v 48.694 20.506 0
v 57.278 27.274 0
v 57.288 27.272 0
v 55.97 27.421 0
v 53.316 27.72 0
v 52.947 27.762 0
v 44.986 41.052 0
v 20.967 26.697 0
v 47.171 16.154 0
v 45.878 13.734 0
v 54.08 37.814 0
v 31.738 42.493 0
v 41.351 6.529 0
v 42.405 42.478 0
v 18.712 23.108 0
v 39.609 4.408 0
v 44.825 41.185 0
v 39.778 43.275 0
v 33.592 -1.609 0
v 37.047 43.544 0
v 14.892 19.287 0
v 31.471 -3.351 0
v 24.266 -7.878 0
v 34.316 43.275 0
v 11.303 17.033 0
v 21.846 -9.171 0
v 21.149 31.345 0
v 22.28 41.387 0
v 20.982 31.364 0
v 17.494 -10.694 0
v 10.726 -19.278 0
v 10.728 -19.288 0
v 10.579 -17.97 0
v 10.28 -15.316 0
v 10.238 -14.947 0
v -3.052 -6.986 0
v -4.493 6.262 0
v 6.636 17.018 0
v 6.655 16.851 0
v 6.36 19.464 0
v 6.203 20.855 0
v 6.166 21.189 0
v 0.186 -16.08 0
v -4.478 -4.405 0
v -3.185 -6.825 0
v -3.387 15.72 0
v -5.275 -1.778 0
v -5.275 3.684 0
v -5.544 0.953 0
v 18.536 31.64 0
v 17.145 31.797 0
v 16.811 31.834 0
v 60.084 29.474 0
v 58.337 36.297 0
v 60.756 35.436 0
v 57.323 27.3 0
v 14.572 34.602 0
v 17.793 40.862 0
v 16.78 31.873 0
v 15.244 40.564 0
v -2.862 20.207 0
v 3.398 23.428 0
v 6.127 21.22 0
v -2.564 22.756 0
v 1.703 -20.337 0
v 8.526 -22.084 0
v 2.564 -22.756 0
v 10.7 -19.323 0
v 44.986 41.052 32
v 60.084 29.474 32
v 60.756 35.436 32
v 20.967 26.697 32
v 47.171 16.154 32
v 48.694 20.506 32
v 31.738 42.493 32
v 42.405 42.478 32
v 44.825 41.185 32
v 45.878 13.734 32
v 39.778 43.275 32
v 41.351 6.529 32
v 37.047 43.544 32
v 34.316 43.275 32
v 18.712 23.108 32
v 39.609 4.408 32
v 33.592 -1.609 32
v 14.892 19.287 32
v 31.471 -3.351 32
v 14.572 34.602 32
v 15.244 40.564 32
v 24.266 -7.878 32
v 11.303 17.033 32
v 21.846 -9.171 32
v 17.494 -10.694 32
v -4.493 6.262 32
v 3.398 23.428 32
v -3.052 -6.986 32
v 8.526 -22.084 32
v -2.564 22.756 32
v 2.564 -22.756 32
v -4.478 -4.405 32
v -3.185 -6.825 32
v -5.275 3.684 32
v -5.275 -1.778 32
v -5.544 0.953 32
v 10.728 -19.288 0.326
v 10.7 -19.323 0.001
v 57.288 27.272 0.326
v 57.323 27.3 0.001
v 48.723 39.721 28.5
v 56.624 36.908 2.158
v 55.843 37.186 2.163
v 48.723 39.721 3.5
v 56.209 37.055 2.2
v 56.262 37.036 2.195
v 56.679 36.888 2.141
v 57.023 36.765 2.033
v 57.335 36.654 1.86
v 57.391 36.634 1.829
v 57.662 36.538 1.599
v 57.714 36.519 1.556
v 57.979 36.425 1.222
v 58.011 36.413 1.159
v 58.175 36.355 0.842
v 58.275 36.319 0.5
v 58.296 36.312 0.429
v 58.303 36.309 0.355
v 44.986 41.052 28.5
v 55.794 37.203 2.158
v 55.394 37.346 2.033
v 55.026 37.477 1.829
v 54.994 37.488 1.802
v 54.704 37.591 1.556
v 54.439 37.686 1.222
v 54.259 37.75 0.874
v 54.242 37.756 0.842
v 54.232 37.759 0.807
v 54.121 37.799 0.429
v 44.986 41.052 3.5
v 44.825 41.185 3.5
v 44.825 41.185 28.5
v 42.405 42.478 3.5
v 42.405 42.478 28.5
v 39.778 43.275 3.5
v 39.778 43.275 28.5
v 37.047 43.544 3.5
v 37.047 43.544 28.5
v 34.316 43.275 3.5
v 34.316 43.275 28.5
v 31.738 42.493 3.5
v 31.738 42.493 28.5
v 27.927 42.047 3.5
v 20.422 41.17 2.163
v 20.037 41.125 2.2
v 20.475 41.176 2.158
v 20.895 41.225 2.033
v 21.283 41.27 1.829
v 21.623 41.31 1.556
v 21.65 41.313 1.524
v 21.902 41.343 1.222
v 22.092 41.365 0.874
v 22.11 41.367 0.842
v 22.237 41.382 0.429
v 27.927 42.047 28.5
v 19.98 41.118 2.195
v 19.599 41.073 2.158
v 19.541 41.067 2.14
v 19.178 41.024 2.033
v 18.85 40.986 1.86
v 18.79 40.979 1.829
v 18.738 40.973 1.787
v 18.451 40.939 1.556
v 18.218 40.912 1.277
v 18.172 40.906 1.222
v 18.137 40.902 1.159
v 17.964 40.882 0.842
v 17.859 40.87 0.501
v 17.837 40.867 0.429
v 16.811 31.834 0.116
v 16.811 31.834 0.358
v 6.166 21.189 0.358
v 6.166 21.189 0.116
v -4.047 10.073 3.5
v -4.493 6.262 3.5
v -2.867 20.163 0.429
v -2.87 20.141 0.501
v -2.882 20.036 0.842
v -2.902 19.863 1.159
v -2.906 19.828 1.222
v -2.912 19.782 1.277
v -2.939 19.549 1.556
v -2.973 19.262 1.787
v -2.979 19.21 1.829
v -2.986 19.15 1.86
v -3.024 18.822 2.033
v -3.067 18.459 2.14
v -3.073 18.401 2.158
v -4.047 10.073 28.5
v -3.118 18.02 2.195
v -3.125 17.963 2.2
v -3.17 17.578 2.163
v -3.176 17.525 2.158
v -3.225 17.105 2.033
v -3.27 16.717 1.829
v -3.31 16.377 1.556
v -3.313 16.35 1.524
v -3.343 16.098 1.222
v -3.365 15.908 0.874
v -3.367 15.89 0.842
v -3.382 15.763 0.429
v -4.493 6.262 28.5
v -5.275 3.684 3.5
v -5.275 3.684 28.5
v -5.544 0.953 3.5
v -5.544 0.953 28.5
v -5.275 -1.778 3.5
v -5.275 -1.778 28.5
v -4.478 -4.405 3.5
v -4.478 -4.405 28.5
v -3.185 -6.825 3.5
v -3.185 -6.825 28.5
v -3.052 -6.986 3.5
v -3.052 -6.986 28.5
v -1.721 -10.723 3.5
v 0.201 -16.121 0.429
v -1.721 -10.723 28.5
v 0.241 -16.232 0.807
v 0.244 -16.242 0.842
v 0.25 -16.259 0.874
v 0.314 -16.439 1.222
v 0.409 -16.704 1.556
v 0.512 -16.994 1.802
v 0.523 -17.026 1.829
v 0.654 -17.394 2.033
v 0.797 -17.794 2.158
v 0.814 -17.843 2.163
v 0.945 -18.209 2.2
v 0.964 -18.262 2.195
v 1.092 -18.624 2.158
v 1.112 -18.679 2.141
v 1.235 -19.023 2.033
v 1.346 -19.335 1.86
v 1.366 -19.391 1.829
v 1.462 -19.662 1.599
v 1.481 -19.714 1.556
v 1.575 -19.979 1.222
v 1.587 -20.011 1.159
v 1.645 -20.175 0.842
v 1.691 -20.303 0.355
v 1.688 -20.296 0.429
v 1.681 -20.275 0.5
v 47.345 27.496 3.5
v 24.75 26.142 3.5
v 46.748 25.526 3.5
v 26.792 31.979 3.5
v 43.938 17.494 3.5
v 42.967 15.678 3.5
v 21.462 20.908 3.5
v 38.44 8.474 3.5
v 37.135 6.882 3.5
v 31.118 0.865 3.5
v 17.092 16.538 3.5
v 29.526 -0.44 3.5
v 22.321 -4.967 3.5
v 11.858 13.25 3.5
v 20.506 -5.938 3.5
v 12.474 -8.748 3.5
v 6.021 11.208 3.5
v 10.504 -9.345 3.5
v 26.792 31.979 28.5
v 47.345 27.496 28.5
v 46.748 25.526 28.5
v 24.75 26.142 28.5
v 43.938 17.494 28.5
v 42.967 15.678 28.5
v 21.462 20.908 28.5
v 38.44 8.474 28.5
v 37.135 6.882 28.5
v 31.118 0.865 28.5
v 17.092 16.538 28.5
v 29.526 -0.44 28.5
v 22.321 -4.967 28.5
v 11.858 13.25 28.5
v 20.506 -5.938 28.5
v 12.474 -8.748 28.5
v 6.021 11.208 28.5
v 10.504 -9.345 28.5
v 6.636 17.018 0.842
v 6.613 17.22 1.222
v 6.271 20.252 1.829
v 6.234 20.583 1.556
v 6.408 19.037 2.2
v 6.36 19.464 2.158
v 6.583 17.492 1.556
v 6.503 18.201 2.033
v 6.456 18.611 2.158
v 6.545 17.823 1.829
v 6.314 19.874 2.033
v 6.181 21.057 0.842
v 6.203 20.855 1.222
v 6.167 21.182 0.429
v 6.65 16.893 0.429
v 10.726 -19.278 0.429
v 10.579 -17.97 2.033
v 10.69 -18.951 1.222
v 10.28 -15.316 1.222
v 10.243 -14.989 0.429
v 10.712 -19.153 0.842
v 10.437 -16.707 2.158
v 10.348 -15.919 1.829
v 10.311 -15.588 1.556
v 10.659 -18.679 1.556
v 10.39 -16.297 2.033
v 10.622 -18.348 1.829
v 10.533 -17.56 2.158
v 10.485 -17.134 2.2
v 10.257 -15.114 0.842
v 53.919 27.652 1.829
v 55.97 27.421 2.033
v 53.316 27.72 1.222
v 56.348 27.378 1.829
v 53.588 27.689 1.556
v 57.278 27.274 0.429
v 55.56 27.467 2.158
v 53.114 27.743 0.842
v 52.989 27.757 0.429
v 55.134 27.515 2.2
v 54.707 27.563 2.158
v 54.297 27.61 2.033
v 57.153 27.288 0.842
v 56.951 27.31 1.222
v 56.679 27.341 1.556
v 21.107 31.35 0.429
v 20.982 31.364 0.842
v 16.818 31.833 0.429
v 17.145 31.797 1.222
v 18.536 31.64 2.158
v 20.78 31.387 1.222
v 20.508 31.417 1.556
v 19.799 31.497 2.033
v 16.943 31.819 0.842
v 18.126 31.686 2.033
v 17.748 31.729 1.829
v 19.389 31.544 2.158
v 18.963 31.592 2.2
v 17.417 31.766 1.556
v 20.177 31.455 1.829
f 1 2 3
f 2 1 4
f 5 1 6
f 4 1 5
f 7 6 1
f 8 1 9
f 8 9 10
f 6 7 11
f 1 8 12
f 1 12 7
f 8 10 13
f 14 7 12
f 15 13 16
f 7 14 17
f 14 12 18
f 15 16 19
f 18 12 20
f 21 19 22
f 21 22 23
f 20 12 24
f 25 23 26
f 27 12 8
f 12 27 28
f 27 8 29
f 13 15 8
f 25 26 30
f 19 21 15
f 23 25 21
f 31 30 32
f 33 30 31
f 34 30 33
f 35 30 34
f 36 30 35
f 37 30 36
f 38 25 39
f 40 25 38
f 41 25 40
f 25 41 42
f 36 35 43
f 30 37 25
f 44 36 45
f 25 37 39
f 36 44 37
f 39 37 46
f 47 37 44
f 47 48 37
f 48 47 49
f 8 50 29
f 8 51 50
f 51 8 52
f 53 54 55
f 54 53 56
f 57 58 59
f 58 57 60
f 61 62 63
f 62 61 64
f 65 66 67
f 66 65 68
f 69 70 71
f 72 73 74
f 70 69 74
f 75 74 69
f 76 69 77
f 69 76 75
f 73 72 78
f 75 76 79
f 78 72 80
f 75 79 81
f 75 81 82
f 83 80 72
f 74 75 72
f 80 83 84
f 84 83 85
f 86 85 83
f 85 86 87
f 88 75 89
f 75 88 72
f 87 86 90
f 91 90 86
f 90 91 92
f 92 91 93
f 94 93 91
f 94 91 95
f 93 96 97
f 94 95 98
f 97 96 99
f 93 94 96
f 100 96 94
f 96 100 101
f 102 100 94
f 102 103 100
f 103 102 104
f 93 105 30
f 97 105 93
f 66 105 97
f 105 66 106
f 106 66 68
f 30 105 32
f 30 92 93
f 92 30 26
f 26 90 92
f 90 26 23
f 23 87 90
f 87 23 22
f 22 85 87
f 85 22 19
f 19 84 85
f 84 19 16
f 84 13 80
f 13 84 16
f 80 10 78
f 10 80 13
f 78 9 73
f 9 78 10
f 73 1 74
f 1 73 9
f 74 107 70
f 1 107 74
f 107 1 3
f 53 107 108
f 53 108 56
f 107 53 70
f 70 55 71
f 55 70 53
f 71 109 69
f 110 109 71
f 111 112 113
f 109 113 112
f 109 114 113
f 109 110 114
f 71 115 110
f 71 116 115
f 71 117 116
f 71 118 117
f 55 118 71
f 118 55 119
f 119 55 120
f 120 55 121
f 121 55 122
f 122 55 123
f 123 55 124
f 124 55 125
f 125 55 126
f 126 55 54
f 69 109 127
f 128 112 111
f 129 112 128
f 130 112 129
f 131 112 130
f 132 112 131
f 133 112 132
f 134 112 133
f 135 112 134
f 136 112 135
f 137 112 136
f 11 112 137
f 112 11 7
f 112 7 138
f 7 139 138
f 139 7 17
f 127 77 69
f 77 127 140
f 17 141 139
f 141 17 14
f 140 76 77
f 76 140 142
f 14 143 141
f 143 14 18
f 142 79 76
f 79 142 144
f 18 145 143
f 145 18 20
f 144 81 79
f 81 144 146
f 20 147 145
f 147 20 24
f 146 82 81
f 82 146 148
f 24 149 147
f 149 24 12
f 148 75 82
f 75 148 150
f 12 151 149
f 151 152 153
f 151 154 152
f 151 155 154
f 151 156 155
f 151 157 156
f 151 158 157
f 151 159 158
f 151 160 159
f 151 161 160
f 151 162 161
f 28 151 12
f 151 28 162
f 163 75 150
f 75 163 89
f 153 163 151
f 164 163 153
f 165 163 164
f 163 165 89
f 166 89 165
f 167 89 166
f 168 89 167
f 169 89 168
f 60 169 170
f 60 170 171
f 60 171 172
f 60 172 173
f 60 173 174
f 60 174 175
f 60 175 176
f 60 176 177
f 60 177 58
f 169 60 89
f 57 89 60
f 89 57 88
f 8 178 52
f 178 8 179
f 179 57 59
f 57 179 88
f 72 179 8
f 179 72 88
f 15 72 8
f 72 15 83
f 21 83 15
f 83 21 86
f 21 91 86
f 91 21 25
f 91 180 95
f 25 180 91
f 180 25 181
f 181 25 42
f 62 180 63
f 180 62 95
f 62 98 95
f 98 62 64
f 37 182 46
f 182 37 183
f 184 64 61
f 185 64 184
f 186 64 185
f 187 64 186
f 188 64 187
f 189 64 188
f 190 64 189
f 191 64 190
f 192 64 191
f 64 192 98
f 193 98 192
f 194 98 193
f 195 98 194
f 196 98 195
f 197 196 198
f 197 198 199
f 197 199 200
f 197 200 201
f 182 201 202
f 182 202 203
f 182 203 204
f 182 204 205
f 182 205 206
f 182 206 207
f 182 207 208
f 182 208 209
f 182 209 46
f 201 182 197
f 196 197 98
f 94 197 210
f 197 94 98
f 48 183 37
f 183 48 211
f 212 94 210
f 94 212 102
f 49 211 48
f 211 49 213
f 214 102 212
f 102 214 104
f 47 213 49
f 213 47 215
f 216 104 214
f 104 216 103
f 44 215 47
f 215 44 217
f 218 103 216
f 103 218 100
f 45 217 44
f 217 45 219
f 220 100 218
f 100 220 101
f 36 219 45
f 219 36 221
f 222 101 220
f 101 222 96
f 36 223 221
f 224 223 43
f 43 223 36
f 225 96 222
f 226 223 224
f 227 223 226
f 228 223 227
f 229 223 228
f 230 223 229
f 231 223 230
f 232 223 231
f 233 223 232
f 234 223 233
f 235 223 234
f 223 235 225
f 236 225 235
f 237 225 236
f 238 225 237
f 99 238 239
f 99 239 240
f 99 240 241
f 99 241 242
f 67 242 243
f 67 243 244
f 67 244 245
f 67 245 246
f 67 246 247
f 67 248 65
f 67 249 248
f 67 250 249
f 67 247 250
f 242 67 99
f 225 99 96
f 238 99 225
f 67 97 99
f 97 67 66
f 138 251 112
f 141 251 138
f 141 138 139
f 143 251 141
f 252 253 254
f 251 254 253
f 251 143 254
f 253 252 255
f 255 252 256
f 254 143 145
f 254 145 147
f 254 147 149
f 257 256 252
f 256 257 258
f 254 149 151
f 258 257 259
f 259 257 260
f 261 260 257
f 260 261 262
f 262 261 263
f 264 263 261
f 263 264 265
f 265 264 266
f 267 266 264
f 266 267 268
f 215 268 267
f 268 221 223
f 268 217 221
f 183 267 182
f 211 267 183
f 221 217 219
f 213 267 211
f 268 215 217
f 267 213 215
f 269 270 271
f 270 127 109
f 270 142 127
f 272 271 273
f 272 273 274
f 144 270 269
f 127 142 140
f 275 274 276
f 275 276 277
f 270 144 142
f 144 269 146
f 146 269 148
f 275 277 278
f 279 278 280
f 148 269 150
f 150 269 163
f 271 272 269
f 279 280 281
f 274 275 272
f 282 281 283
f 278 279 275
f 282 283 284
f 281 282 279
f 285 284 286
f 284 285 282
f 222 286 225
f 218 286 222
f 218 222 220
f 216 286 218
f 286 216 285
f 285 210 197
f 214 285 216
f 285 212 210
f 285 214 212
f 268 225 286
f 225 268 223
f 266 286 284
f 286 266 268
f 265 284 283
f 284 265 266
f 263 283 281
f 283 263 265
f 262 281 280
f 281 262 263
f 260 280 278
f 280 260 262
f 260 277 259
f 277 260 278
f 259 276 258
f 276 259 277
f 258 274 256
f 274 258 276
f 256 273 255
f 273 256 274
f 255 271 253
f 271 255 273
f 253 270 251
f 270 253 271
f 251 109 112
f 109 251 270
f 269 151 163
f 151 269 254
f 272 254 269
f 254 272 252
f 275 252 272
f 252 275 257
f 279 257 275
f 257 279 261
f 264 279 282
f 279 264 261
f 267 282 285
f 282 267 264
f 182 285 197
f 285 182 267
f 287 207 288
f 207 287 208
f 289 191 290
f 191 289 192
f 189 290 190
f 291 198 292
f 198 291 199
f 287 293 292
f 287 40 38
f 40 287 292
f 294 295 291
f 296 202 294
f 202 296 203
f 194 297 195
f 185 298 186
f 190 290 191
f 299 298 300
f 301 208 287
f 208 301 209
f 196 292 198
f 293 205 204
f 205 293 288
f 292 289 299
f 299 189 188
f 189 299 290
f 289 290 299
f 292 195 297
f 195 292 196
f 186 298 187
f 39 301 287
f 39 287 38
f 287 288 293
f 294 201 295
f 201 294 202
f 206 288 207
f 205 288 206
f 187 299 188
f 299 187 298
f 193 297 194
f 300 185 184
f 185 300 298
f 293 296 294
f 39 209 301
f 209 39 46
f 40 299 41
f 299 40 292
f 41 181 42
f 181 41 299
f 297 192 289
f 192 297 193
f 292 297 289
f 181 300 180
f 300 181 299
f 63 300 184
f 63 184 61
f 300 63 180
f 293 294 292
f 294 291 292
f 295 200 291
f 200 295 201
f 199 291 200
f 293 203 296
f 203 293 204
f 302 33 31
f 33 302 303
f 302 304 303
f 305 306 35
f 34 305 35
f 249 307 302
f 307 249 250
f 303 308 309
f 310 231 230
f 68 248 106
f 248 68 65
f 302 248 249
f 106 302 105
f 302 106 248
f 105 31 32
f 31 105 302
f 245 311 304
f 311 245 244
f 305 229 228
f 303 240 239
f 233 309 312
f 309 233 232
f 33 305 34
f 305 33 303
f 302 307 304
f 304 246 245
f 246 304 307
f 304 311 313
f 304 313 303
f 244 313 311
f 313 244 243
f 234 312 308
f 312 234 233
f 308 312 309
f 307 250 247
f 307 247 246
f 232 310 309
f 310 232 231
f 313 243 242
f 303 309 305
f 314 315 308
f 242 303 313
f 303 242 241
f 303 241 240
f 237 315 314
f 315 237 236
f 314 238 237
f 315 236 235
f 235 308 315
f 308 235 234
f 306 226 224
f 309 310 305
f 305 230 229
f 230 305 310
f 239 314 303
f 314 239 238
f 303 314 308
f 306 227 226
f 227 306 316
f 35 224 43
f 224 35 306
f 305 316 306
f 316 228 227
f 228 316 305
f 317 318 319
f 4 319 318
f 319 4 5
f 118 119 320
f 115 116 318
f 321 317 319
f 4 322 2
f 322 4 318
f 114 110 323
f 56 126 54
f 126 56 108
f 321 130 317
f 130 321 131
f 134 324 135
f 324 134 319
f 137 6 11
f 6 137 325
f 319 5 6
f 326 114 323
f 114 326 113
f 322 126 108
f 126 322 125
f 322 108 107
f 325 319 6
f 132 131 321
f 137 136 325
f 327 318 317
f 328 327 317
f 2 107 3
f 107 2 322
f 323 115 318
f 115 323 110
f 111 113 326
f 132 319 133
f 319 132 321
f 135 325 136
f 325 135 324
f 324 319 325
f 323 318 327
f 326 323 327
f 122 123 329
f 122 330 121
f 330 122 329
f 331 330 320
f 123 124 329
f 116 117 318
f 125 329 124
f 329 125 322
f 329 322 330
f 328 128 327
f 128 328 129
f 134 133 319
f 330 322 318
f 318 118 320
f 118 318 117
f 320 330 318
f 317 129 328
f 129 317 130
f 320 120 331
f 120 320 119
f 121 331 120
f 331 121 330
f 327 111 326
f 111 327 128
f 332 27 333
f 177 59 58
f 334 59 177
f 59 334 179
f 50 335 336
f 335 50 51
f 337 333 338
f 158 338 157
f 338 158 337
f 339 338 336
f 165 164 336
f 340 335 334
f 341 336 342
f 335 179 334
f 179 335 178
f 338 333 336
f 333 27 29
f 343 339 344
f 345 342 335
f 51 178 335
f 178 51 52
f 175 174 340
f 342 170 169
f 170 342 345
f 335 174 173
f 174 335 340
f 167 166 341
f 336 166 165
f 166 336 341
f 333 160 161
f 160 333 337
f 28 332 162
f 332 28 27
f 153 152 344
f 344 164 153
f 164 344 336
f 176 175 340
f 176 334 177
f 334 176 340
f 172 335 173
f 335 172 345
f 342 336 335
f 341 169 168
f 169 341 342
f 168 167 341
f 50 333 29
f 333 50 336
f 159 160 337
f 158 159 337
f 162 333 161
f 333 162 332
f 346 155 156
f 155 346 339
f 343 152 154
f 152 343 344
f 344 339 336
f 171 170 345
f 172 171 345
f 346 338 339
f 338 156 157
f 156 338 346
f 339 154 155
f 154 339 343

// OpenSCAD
$fn = 32;

// ----------------------------------------------------------------------
// Air duct: 28 mm duct, 3.5 mm wall, 32 mm across
// ----------------------------------------------------------------------

// --- parameters (mm) ---
duct_r = 14;              // duct core radius
duct_d = 28;              // duct core diameter
wall = 3.5;               // duct wall thickness
height = 32;              // duct width (extrusion height)
port_r = 22.9;            // port flange half width
port_d = 45.8;            // port flange width
port_t = 6;               // port flange thickness
bolt_d = 4.4;             // port bolt holes
bolt_offset = 18.2;       // bolt hole offset from the port axis

difference() {
  /* outer hull chain: tube with a flat flange plate at every port */
  linear_extrude(height = 32) {
    hull() {
      polygon([[2.564, -22.756], [-2.564, 22.756], [3.398, 23.428], [8.526, -22.084]]);
      translate([8.943, 1.008]) circle(r = 14);
    }
    hull() {
      translate([8.943, 1.008]) circle(r = 14);
      translate([8.456, 0.953]) circle(r = 14);
    }
    hull() {
      translate([8.456, 0.953]) circle(r = 14);
      translate([16.488, 3.763]) circle(r = 14);
    }
    hull() {
      translate([16.488, 3.763]) circle(r = 14);
      translate([23.693, 8.29]) circle(r = 14);
    }
    hull() {
      translate([23.693, 8.29]) circle(r = 14);
      translate([29.71, 14.307]) circle(r = 14);
    }
    hull() {
      translate([29.71, 14.307]) circle(r = 14);
      translate([34.237, 21.512]) circle(r = 14);
    }
    hull() {
      translate([34.237, 21.512]) circle(r = 14);
      translate([37.047, 29.544]) circle(r = 14);
    }
    hull() {
      translate([37.047, 29.544]) circle(r = 14);
      translate([36.992, 29.057]) circle(r = 14);
    }
    hull() {
      translate([36.992, 29.057]) circle(r = 14);
      polygon([[15.244, 40.564], [60.756, 35.436], [60.084, 29.474], [14.572, 34.602]]);
    }
  }
  /* air passage: the same chain inset by the wall, 5 mm proud of the ports */
  translate([0, 0, 3.5]) linear_extrude(height = 25) {
    hull() {
      translate([-4.969, -0.56]) circle(r = 10.5);
      translate([8.456, 0.953]) circle(r = 10.5);
    }
    hull() {
      translate([8.456, 0.953]) circle(r = 10.5);
      translate([16.488, 3.763]) circle(r = 10.5);
    }
    hull() {
      translate([16.488, 3.763]) circle(r = 10.5);
      translate([23.693, 8.29]) circle(r = 10.5);
    }
    hull() {
      translate([23.693, 8.29]) circle(r = 10.5);
      translate([29.71, 14.307]) circle(r = 10.5);
    }
    hull() {
      translate([29.71, 14.307]) circle(r = 10.5);
      translate([34.237, 21.512]) circle(r = 10.5);
    }
    hull() {
      translate([34.237, 21.512]) circle(r = 10.5);
      translate([37.047, 29.544]) circle(r = 10.5);
    }
    hull() {
      translate([37.047, 29.544]) circle(r = 10.5);
      translate([38.56, 42.969]) circle(r = 10.5);
    }
  }
  translate([0, 0]) rotate([0, 0, -83.57]) translate([-18.2, -2.5]) rotate([-90, 0, 0]) cylinder(h = 11, d = 4.4);
  translate([0, 0]) rotate([0, 0, -83.57]) translate([18.2, -2.5]) rotate([-90, 0, 0]) cylinder(h = 11, d = 4.4);
  translate([38, 38]) rotate([0, 0, 173.57]) translate([-18.2, -2.5]) rotate([-90, 0, 0]) cylinder(h = 11, d = 4.4);
  translate([38, 38]) rotate([0, 0, 173.57]) translate([18.2, -2.5]) rotate([-90, 0, 0]) cylinder(h = 11, d = 4.4);
}
